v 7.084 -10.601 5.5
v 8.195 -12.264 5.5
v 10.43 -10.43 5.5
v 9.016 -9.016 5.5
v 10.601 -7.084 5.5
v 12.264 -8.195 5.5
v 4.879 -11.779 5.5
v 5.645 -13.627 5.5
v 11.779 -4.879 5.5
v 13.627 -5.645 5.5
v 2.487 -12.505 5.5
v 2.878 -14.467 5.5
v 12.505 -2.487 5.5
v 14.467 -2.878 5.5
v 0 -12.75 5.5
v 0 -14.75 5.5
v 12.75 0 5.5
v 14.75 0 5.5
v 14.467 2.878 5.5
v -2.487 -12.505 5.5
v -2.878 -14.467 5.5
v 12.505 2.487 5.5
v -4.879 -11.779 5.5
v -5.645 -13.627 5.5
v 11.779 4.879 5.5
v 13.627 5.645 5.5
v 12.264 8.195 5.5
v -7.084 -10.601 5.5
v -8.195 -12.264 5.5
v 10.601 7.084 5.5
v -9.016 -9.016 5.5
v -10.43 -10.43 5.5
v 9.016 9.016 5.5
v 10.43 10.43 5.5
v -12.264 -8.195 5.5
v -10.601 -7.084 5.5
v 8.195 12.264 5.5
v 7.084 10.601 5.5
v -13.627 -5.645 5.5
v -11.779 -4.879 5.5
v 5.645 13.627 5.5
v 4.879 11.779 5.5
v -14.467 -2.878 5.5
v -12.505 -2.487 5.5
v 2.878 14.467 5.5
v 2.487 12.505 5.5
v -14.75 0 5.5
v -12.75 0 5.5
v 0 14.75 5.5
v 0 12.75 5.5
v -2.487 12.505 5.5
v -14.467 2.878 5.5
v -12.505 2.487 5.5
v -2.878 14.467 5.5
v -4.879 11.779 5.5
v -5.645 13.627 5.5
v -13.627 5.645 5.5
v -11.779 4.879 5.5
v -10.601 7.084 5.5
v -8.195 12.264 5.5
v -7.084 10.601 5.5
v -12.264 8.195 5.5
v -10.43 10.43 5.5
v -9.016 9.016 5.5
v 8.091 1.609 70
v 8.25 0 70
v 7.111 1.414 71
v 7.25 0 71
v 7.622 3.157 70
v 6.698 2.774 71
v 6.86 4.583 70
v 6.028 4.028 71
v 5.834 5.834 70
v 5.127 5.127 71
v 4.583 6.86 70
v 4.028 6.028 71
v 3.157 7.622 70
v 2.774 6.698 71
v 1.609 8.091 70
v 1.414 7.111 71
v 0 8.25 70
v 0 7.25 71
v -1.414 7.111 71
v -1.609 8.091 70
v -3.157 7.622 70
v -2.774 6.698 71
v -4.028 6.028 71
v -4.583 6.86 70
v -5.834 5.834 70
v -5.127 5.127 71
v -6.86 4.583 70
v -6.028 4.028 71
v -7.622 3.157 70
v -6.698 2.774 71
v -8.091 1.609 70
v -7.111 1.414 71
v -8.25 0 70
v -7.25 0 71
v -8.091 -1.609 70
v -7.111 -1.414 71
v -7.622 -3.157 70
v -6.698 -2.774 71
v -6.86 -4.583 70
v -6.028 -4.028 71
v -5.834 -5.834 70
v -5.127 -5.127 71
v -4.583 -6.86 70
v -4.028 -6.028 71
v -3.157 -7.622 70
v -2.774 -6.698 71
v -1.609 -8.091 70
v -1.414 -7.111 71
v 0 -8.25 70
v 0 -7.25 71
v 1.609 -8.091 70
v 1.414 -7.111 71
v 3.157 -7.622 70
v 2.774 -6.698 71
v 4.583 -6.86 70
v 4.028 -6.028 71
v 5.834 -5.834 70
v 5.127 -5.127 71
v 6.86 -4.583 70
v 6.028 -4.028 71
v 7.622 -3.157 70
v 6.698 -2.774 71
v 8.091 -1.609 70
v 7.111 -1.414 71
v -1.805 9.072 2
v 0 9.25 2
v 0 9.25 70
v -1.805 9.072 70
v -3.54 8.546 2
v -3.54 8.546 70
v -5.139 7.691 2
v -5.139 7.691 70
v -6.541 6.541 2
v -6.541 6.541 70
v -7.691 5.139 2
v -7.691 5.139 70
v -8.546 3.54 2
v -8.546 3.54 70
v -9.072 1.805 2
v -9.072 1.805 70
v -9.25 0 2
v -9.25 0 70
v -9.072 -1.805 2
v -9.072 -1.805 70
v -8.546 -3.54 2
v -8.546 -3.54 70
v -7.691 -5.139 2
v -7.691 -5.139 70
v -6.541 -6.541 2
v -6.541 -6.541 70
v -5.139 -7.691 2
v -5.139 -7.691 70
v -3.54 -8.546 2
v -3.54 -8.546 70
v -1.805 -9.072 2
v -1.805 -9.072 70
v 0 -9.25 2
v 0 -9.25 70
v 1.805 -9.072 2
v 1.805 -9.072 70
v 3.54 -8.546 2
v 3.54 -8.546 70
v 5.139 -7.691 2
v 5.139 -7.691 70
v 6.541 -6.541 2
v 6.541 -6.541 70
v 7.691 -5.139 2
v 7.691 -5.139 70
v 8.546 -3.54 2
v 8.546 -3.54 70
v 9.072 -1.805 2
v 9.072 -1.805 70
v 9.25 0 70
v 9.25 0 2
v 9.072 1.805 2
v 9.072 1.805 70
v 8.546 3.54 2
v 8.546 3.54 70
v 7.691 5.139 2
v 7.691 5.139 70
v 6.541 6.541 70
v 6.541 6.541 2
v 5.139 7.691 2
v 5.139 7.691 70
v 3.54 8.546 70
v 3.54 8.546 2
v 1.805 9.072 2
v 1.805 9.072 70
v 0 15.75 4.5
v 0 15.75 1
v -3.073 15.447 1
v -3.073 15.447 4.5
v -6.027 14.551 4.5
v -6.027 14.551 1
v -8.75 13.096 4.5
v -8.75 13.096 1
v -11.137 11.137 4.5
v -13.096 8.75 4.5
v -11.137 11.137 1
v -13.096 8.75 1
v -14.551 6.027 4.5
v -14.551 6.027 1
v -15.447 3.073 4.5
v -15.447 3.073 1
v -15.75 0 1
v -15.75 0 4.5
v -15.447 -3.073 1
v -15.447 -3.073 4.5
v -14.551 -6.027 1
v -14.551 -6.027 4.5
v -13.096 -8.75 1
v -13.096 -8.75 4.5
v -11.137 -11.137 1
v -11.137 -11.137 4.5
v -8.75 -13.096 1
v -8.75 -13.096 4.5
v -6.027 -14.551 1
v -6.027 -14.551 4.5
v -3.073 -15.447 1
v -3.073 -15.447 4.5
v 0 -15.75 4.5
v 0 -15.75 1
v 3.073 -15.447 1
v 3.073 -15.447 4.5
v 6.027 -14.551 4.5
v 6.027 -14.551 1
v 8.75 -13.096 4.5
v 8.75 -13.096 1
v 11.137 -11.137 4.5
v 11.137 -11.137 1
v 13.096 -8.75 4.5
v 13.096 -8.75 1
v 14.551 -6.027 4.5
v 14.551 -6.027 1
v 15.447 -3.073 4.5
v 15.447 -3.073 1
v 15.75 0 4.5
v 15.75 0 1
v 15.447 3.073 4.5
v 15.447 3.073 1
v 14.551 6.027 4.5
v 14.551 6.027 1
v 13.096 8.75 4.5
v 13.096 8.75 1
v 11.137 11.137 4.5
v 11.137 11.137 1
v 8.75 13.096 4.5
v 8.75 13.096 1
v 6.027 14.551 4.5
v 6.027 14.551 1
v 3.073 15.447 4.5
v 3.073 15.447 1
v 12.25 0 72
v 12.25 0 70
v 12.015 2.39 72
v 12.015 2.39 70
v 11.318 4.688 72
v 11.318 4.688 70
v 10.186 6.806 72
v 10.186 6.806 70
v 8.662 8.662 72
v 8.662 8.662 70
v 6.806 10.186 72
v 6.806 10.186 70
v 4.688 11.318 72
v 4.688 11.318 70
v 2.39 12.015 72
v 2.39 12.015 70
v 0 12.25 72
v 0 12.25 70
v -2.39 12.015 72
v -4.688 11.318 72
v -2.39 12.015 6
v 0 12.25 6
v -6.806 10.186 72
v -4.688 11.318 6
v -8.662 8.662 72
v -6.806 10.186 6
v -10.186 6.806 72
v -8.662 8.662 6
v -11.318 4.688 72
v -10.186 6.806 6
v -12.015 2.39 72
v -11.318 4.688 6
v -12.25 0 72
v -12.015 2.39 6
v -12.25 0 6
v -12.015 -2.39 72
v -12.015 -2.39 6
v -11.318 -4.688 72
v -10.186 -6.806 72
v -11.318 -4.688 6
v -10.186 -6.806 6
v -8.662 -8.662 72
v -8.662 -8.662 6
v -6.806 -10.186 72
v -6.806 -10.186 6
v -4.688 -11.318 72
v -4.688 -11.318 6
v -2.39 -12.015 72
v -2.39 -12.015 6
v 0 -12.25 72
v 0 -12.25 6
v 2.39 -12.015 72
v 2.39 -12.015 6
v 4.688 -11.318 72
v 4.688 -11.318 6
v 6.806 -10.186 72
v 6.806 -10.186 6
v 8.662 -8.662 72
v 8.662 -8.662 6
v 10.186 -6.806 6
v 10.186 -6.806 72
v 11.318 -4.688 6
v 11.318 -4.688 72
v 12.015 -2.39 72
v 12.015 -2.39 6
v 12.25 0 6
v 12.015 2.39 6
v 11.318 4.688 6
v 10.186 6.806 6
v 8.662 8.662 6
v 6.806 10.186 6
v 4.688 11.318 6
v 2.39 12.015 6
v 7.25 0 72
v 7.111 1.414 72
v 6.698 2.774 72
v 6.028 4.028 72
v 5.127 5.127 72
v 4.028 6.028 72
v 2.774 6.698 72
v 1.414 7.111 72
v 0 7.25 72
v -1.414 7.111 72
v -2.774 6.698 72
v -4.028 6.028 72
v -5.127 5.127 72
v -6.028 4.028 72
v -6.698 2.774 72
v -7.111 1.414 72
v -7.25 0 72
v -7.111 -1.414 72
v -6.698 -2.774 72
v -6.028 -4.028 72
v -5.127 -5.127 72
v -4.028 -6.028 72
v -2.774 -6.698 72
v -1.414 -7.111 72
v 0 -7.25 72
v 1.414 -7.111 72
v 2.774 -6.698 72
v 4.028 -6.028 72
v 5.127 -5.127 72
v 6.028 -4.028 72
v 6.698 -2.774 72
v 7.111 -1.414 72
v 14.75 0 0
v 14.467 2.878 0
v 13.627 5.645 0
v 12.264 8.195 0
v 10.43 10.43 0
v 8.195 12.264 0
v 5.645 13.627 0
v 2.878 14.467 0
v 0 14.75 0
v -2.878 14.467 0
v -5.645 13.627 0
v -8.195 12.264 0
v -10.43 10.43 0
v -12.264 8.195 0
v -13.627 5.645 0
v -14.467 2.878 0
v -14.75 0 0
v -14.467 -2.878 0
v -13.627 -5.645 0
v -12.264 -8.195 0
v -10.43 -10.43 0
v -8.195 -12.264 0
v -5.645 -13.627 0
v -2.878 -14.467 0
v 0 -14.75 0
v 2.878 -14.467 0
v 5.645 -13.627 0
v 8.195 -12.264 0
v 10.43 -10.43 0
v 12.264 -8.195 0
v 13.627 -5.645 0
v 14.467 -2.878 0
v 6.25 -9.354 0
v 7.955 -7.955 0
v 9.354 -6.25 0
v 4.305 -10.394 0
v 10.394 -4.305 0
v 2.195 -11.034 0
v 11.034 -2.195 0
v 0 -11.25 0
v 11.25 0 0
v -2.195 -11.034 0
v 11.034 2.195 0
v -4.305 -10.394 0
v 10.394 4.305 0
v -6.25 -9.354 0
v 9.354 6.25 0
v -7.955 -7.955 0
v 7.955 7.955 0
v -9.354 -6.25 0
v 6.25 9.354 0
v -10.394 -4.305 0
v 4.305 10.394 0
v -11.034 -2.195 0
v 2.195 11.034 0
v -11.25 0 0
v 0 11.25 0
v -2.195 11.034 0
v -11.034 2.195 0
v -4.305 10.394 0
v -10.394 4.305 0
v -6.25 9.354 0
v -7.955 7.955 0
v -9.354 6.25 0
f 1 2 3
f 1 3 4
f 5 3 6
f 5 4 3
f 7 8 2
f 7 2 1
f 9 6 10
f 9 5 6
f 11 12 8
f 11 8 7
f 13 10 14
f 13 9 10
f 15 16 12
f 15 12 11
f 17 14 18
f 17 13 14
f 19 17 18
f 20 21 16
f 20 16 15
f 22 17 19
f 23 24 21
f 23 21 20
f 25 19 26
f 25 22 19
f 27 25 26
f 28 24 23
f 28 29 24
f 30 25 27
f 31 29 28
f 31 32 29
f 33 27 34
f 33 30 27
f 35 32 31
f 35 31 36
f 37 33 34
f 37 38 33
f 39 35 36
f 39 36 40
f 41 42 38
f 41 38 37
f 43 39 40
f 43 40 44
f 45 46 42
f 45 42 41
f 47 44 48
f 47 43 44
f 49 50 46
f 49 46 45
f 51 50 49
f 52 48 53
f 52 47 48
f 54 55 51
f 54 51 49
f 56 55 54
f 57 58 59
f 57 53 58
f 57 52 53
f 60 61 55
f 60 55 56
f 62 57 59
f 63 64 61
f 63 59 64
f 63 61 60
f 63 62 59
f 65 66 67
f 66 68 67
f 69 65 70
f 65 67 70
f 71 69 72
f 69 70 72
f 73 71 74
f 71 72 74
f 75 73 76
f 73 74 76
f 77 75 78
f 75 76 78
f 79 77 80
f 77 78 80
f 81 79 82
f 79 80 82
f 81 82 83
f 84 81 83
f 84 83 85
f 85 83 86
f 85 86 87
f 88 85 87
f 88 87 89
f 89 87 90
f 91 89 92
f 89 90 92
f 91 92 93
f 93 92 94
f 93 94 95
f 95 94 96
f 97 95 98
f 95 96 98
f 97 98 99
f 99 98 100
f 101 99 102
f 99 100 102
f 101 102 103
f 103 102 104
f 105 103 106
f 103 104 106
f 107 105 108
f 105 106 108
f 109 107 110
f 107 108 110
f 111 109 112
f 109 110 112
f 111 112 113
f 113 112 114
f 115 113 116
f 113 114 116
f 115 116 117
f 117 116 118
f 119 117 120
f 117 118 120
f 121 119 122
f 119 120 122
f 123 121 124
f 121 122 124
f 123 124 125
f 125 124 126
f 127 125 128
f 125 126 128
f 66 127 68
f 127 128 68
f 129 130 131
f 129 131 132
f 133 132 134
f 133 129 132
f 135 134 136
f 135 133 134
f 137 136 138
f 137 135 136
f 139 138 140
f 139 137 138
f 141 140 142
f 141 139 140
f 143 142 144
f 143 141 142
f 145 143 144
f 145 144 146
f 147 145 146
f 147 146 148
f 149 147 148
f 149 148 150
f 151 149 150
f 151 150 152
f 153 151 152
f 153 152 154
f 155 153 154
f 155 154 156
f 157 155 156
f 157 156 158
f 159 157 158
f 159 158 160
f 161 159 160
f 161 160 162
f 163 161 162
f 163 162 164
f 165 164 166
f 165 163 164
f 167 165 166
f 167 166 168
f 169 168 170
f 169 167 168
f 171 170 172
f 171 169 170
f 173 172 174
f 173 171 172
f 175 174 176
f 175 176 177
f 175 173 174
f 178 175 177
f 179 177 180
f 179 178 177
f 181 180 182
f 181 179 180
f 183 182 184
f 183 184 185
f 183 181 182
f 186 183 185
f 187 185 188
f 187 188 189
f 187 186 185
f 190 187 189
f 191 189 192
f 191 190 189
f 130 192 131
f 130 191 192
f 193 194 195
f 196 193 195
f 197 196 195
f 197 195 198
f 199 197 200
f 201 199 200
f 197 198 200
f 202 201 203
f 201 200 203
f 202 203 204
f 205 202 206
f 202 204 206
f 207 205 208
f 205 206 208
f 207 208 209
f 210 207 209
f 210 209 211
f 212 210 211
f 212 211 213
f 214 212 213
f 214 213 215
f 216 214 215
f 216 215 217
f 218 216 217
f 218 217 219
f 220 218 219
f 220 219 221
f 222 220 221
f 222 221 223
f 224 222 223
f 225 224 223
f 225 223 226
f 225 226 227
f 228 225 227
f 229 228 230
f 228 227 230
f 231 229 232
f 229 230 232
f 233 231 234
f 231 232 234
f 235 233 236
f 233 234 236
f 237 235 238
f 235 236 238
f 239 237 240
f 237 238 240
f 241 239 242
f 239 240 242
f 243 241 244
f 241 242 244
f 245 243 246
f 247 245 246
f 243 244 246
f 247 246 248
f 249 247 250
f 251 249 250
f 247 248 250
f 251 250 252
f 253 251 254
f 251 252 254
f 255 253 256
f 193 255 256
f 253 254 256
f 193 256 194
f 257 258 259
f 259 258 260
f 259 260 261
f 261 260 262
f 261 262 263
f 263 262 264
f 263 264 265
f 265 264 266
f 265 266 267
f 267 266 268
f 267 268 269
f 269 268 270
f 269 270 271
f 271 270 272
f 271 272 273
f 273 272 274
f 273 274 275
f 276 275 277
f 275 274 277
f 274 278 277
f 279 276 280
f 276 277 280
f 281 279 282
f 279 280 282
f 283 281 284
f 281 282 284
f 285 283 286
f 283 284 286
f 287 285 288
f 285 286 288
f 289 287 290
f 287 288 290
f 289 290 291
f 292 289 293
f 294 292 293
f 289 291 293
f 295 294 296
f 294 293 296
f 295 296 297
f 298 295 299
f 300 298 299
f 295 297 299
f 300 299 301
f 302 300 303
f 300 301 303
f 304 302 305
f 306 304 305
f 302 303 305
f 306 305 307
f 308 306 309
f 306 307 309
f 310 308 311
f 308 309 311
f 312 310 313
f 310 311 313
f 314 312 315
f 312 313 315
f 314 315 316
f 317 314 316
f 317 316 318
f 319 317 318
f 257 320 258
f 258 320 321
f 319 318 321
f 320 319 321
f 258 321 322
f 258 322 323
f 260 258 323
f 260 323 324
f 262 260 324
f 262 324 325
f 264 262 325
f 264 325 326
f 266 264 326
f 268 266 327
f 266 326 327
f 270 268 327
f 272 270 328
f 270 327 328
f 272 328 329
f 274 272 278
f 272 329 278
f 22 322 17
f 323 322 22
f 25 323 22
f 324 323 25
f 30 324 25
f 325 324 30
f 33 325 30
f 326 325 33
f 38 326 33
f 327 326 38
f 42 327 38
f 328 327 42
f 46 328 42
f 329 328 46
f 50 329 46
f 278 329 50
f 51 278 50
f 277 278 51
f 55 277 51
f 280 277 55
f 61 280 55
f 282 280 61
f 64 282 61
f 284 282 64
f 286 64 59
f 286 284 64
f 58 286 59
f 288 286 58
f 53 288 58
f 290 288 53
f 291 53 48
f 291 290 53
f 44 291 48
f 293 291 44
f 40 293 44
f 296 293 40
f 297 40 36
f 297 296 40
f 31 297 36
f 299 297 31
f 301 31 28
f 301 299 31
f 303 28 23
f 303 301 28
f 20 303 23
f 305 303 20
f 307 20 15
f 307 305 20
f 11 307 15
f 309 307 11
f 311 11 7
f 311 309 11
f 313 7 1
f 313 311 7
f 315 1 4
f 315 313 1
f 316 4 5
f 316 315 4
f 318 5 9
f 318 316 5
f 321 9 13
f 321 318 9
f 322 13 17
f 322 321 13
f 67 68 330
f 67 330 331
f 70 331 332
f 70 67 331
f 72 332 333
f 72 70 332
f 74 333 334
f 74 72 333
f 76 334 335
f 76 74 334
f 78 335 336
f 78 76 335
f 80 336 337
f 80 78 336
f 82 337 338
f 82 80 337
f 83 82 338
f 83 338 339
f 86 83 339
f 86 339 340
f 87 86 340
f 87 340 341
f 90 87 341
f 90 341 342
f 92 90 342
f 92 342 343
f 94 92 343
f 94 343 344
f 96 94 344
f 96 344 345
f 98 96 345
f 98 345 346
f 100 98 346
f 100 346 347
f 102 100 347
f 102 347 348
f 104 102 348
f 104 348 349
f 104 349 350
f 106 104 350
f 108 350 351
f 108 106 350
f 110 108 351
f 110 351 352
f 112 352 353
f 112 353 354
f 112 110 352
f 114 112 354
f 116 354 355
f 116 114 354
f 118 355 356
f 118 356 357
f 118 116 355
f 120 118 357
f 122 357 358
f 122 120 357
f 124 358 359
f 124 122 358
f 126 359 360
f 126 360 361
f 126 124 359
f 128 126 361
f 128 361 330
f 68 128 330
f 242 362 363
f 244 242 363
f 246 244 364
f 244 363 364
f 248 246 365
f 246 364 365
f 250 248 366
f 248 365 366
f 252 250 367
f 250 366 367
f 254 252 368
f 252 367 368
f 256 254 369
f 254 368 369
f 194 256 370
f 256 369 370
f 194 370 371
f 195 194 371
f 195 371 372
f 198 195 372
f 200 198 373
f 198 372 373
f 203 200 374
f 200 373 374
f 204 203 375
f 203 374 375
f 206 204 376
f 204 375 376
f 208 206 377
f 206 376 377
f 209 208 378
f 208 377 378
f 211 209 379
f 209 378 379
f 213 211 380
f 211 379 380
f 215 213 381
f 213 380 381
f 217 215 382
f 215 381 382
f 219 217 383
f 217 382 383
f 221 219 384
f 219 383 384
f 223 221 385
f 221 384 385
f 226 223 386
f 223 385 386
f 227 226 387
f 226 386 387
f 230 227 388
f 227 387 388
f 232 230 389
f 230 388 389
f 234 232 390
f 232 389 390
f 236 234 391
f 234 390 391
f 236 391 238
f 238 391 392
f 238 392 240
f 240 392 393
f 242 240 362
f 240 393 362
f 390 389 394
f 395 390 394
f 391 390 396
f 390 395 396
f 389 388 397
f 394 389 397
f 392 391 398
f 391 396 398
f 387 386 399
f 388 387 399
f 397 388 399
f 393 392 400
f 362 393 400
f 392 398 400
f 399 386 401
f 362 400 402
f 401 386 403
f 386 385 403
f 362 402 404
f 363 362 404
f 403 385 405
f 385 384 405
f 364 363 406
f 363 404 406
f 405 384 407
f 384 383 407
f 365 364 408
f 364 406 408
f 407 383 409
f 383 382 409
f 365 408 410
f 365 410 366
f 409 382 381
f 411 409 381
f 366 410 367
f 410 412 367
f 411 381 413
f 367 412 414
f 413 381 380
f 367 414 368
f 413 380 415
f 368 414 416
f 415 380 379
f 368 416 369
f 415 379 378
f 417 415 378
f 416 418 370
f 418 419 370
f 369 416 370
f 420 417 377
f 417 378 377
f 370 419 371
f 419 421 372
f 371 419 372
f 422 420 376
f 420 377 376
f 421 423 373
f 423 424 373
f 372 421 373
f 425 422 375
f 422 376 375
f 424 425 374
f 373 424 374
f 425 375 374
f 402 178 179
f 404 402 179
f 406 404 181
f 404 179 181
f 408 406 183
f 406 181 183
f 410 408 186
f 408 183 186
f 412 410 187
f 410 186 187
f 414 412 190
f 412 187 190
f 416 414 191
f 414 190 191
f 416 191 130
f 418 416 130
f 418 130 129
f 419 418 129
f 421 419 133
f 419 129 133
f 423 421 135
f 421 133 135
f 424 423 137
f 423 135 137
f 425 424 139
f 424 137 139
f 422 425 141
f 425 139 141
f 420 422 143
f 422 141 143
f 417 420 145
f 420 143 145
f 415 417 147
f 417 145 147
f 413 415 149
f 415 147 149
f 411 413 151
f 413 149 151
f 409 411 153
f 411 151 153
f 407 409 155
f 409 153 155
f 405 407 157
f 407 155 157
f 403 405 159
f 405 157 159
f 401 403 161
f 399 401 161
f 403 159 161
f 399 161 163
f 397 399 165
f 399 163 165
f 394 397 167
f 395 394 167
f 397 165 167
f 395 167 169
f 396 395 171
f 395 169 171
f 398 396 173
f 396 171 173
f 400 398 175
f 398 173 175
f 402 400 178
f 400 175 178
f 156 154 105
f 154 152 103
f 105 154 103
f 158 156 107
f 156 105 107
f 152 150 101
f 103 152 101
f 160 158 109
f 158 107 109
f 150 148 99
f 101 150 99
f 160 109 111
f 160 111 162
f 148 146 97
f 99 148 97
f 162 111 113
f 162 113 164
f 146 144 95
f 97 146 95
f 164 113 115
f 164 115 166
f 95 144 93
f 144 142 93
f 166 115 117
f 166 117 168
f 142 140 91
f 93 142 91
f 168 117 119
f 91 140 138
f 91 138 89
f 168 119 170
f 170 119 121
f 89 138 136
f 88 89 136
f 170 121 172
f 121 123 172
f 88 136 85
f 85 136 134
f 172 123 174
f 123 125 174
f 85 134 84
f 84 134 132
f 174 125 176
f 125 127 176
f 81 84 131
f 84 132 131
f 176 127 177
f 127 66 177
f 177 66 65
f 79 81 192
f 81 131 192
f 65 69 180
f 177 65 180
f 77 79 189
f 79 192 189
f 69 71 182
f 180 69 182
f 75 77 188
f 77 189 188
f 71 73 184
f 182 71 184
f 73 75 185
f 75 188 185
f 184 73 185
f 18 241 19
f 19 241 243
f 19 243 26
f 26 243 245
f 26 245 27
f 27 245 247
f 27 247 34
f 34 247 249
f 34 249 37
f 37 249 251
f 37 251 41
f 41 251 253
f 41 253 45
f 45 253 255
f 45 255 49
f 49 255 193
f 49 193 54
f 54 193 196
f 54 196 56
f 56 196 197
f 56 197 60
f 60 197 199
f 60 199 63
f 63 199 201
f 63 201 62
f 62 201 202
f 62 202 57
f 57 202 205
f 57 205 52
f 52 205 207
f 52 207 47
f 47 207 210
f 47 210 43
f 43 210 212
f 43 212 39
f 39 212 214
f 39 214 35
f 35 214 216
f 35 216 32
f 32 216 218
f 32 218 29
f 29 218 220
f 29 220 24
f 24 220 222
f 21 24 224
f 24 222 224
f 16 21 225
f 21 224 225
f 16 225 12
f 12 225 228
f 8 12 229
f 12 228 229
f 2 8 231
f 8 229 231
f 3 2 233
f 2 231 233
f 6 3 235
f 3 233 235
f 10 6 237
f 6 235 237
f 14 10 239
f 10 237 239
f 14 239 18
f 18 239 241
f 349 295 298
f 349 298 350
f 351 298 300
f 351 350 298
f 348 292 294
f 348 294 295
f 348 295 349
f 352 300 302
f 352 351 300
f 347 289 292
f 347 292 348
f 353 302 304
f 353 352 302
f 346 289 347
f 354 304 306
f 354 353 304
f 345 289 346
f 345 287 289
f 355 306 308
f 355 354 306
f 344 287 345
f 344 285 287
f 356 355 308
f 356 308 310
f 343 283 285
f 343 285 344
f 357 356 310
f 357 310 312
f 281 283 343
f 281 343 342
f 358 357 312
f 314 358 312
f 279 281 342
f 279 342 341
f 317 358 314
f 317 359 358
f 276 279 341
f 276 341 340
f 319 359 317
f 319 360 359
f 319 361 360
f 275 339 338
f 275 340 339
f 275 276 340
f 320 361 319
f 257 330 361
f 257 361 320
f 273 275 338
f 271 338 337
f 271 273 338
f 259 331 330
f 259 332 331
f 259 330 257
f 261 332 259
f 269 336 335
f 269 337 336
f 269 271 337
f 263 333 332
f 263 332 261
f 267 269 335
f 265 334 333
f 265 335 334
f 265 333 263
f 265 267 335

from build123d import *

# Parameters (mm, degrees)
SKETCH1_R           = 12.25
SKETCH1_R_2         = 9.25
EXTRUDE_THIN1_DEPTH = 70
SKETCH3_R           = 15.75
SKETCH3_R_2         = 10.75
EXTRUDE_THIN2_DEPTH = 5.5
SKETCH4_R           = 12.25
SKETCH4_R_2         = 7.25
EXTRUDE_THIN3_DEPTH = 2


with BuildPart() as part:
    # Sketch1 → Extrude-Thin1 (new body)
    with BuildSketch(Plane(origin=(0, 0, 0), x_dir=(0, 1, 0), z_dir=(0, 0, 1))):
        Circle(SKETCH1_R)
        Circle(SKETCH1_R_2, mode=Mode.SUBTRACT)
    extrude(amount=EXTRUDE_THIN1_DEPTH)

    # Sketch3 → Extrude-Thin2 (add)
    with BuildSketch(Plane(origin=(0, 0, 0), x_dir=(0, 1, 0), z_dir=(0, 0, 1))):
        Circle(SKETCH3_R)
        Circle(SKETCH3_R_2, mode=Mode.SUBTRACT)
    extrude(amount=EXTRUDE_THIN2_DEPTH)

    # Sketch4 → Extrude-Thin3 (add)
    with BuildSketch(Plane.XY.offset(70)):
        Circle(SKETCH4_R)
        Circle(SKETCH4_R_2, mode=Mode.SUBTRACT)
    extrude(amount=EXTRUDE_THIN3_DEPTH)

    # Chamfer1: read off the stored shape, not the designer's step
    # Chamfer1 outline → Chamfer1 (revolve, cut)
    with BuildSketch(Plane.XZ):
        Polygon((9.25, 2), (9.25, 0), (11.25, 0), align=None)
        Polygon((15.75, 1), (14.75, 0), (15.75, 0), align=None)
        Polygon((7.25, 70), (8.25, 70), (7.25, 71), align=None)
        Polygon((14.75, 5.5), (15.75, 4.5), (15.75, 5.5), align=None)
    revolve(axis=Axis((0, 0, 0), (0, 0, 1)), mode=Mode.SUBTRACT)

    # Chamfer1 2 outline → Chamfer1 2 (revolve)
    with BuildSketch(Plane.XZ):
        Polygon((12.25, 6), (12.25, 5.5), (12.75, 5.5), align=None)
    revolve(axis=Axis((0, 0, 0), (0, 0, 1)))


solid = part.part
